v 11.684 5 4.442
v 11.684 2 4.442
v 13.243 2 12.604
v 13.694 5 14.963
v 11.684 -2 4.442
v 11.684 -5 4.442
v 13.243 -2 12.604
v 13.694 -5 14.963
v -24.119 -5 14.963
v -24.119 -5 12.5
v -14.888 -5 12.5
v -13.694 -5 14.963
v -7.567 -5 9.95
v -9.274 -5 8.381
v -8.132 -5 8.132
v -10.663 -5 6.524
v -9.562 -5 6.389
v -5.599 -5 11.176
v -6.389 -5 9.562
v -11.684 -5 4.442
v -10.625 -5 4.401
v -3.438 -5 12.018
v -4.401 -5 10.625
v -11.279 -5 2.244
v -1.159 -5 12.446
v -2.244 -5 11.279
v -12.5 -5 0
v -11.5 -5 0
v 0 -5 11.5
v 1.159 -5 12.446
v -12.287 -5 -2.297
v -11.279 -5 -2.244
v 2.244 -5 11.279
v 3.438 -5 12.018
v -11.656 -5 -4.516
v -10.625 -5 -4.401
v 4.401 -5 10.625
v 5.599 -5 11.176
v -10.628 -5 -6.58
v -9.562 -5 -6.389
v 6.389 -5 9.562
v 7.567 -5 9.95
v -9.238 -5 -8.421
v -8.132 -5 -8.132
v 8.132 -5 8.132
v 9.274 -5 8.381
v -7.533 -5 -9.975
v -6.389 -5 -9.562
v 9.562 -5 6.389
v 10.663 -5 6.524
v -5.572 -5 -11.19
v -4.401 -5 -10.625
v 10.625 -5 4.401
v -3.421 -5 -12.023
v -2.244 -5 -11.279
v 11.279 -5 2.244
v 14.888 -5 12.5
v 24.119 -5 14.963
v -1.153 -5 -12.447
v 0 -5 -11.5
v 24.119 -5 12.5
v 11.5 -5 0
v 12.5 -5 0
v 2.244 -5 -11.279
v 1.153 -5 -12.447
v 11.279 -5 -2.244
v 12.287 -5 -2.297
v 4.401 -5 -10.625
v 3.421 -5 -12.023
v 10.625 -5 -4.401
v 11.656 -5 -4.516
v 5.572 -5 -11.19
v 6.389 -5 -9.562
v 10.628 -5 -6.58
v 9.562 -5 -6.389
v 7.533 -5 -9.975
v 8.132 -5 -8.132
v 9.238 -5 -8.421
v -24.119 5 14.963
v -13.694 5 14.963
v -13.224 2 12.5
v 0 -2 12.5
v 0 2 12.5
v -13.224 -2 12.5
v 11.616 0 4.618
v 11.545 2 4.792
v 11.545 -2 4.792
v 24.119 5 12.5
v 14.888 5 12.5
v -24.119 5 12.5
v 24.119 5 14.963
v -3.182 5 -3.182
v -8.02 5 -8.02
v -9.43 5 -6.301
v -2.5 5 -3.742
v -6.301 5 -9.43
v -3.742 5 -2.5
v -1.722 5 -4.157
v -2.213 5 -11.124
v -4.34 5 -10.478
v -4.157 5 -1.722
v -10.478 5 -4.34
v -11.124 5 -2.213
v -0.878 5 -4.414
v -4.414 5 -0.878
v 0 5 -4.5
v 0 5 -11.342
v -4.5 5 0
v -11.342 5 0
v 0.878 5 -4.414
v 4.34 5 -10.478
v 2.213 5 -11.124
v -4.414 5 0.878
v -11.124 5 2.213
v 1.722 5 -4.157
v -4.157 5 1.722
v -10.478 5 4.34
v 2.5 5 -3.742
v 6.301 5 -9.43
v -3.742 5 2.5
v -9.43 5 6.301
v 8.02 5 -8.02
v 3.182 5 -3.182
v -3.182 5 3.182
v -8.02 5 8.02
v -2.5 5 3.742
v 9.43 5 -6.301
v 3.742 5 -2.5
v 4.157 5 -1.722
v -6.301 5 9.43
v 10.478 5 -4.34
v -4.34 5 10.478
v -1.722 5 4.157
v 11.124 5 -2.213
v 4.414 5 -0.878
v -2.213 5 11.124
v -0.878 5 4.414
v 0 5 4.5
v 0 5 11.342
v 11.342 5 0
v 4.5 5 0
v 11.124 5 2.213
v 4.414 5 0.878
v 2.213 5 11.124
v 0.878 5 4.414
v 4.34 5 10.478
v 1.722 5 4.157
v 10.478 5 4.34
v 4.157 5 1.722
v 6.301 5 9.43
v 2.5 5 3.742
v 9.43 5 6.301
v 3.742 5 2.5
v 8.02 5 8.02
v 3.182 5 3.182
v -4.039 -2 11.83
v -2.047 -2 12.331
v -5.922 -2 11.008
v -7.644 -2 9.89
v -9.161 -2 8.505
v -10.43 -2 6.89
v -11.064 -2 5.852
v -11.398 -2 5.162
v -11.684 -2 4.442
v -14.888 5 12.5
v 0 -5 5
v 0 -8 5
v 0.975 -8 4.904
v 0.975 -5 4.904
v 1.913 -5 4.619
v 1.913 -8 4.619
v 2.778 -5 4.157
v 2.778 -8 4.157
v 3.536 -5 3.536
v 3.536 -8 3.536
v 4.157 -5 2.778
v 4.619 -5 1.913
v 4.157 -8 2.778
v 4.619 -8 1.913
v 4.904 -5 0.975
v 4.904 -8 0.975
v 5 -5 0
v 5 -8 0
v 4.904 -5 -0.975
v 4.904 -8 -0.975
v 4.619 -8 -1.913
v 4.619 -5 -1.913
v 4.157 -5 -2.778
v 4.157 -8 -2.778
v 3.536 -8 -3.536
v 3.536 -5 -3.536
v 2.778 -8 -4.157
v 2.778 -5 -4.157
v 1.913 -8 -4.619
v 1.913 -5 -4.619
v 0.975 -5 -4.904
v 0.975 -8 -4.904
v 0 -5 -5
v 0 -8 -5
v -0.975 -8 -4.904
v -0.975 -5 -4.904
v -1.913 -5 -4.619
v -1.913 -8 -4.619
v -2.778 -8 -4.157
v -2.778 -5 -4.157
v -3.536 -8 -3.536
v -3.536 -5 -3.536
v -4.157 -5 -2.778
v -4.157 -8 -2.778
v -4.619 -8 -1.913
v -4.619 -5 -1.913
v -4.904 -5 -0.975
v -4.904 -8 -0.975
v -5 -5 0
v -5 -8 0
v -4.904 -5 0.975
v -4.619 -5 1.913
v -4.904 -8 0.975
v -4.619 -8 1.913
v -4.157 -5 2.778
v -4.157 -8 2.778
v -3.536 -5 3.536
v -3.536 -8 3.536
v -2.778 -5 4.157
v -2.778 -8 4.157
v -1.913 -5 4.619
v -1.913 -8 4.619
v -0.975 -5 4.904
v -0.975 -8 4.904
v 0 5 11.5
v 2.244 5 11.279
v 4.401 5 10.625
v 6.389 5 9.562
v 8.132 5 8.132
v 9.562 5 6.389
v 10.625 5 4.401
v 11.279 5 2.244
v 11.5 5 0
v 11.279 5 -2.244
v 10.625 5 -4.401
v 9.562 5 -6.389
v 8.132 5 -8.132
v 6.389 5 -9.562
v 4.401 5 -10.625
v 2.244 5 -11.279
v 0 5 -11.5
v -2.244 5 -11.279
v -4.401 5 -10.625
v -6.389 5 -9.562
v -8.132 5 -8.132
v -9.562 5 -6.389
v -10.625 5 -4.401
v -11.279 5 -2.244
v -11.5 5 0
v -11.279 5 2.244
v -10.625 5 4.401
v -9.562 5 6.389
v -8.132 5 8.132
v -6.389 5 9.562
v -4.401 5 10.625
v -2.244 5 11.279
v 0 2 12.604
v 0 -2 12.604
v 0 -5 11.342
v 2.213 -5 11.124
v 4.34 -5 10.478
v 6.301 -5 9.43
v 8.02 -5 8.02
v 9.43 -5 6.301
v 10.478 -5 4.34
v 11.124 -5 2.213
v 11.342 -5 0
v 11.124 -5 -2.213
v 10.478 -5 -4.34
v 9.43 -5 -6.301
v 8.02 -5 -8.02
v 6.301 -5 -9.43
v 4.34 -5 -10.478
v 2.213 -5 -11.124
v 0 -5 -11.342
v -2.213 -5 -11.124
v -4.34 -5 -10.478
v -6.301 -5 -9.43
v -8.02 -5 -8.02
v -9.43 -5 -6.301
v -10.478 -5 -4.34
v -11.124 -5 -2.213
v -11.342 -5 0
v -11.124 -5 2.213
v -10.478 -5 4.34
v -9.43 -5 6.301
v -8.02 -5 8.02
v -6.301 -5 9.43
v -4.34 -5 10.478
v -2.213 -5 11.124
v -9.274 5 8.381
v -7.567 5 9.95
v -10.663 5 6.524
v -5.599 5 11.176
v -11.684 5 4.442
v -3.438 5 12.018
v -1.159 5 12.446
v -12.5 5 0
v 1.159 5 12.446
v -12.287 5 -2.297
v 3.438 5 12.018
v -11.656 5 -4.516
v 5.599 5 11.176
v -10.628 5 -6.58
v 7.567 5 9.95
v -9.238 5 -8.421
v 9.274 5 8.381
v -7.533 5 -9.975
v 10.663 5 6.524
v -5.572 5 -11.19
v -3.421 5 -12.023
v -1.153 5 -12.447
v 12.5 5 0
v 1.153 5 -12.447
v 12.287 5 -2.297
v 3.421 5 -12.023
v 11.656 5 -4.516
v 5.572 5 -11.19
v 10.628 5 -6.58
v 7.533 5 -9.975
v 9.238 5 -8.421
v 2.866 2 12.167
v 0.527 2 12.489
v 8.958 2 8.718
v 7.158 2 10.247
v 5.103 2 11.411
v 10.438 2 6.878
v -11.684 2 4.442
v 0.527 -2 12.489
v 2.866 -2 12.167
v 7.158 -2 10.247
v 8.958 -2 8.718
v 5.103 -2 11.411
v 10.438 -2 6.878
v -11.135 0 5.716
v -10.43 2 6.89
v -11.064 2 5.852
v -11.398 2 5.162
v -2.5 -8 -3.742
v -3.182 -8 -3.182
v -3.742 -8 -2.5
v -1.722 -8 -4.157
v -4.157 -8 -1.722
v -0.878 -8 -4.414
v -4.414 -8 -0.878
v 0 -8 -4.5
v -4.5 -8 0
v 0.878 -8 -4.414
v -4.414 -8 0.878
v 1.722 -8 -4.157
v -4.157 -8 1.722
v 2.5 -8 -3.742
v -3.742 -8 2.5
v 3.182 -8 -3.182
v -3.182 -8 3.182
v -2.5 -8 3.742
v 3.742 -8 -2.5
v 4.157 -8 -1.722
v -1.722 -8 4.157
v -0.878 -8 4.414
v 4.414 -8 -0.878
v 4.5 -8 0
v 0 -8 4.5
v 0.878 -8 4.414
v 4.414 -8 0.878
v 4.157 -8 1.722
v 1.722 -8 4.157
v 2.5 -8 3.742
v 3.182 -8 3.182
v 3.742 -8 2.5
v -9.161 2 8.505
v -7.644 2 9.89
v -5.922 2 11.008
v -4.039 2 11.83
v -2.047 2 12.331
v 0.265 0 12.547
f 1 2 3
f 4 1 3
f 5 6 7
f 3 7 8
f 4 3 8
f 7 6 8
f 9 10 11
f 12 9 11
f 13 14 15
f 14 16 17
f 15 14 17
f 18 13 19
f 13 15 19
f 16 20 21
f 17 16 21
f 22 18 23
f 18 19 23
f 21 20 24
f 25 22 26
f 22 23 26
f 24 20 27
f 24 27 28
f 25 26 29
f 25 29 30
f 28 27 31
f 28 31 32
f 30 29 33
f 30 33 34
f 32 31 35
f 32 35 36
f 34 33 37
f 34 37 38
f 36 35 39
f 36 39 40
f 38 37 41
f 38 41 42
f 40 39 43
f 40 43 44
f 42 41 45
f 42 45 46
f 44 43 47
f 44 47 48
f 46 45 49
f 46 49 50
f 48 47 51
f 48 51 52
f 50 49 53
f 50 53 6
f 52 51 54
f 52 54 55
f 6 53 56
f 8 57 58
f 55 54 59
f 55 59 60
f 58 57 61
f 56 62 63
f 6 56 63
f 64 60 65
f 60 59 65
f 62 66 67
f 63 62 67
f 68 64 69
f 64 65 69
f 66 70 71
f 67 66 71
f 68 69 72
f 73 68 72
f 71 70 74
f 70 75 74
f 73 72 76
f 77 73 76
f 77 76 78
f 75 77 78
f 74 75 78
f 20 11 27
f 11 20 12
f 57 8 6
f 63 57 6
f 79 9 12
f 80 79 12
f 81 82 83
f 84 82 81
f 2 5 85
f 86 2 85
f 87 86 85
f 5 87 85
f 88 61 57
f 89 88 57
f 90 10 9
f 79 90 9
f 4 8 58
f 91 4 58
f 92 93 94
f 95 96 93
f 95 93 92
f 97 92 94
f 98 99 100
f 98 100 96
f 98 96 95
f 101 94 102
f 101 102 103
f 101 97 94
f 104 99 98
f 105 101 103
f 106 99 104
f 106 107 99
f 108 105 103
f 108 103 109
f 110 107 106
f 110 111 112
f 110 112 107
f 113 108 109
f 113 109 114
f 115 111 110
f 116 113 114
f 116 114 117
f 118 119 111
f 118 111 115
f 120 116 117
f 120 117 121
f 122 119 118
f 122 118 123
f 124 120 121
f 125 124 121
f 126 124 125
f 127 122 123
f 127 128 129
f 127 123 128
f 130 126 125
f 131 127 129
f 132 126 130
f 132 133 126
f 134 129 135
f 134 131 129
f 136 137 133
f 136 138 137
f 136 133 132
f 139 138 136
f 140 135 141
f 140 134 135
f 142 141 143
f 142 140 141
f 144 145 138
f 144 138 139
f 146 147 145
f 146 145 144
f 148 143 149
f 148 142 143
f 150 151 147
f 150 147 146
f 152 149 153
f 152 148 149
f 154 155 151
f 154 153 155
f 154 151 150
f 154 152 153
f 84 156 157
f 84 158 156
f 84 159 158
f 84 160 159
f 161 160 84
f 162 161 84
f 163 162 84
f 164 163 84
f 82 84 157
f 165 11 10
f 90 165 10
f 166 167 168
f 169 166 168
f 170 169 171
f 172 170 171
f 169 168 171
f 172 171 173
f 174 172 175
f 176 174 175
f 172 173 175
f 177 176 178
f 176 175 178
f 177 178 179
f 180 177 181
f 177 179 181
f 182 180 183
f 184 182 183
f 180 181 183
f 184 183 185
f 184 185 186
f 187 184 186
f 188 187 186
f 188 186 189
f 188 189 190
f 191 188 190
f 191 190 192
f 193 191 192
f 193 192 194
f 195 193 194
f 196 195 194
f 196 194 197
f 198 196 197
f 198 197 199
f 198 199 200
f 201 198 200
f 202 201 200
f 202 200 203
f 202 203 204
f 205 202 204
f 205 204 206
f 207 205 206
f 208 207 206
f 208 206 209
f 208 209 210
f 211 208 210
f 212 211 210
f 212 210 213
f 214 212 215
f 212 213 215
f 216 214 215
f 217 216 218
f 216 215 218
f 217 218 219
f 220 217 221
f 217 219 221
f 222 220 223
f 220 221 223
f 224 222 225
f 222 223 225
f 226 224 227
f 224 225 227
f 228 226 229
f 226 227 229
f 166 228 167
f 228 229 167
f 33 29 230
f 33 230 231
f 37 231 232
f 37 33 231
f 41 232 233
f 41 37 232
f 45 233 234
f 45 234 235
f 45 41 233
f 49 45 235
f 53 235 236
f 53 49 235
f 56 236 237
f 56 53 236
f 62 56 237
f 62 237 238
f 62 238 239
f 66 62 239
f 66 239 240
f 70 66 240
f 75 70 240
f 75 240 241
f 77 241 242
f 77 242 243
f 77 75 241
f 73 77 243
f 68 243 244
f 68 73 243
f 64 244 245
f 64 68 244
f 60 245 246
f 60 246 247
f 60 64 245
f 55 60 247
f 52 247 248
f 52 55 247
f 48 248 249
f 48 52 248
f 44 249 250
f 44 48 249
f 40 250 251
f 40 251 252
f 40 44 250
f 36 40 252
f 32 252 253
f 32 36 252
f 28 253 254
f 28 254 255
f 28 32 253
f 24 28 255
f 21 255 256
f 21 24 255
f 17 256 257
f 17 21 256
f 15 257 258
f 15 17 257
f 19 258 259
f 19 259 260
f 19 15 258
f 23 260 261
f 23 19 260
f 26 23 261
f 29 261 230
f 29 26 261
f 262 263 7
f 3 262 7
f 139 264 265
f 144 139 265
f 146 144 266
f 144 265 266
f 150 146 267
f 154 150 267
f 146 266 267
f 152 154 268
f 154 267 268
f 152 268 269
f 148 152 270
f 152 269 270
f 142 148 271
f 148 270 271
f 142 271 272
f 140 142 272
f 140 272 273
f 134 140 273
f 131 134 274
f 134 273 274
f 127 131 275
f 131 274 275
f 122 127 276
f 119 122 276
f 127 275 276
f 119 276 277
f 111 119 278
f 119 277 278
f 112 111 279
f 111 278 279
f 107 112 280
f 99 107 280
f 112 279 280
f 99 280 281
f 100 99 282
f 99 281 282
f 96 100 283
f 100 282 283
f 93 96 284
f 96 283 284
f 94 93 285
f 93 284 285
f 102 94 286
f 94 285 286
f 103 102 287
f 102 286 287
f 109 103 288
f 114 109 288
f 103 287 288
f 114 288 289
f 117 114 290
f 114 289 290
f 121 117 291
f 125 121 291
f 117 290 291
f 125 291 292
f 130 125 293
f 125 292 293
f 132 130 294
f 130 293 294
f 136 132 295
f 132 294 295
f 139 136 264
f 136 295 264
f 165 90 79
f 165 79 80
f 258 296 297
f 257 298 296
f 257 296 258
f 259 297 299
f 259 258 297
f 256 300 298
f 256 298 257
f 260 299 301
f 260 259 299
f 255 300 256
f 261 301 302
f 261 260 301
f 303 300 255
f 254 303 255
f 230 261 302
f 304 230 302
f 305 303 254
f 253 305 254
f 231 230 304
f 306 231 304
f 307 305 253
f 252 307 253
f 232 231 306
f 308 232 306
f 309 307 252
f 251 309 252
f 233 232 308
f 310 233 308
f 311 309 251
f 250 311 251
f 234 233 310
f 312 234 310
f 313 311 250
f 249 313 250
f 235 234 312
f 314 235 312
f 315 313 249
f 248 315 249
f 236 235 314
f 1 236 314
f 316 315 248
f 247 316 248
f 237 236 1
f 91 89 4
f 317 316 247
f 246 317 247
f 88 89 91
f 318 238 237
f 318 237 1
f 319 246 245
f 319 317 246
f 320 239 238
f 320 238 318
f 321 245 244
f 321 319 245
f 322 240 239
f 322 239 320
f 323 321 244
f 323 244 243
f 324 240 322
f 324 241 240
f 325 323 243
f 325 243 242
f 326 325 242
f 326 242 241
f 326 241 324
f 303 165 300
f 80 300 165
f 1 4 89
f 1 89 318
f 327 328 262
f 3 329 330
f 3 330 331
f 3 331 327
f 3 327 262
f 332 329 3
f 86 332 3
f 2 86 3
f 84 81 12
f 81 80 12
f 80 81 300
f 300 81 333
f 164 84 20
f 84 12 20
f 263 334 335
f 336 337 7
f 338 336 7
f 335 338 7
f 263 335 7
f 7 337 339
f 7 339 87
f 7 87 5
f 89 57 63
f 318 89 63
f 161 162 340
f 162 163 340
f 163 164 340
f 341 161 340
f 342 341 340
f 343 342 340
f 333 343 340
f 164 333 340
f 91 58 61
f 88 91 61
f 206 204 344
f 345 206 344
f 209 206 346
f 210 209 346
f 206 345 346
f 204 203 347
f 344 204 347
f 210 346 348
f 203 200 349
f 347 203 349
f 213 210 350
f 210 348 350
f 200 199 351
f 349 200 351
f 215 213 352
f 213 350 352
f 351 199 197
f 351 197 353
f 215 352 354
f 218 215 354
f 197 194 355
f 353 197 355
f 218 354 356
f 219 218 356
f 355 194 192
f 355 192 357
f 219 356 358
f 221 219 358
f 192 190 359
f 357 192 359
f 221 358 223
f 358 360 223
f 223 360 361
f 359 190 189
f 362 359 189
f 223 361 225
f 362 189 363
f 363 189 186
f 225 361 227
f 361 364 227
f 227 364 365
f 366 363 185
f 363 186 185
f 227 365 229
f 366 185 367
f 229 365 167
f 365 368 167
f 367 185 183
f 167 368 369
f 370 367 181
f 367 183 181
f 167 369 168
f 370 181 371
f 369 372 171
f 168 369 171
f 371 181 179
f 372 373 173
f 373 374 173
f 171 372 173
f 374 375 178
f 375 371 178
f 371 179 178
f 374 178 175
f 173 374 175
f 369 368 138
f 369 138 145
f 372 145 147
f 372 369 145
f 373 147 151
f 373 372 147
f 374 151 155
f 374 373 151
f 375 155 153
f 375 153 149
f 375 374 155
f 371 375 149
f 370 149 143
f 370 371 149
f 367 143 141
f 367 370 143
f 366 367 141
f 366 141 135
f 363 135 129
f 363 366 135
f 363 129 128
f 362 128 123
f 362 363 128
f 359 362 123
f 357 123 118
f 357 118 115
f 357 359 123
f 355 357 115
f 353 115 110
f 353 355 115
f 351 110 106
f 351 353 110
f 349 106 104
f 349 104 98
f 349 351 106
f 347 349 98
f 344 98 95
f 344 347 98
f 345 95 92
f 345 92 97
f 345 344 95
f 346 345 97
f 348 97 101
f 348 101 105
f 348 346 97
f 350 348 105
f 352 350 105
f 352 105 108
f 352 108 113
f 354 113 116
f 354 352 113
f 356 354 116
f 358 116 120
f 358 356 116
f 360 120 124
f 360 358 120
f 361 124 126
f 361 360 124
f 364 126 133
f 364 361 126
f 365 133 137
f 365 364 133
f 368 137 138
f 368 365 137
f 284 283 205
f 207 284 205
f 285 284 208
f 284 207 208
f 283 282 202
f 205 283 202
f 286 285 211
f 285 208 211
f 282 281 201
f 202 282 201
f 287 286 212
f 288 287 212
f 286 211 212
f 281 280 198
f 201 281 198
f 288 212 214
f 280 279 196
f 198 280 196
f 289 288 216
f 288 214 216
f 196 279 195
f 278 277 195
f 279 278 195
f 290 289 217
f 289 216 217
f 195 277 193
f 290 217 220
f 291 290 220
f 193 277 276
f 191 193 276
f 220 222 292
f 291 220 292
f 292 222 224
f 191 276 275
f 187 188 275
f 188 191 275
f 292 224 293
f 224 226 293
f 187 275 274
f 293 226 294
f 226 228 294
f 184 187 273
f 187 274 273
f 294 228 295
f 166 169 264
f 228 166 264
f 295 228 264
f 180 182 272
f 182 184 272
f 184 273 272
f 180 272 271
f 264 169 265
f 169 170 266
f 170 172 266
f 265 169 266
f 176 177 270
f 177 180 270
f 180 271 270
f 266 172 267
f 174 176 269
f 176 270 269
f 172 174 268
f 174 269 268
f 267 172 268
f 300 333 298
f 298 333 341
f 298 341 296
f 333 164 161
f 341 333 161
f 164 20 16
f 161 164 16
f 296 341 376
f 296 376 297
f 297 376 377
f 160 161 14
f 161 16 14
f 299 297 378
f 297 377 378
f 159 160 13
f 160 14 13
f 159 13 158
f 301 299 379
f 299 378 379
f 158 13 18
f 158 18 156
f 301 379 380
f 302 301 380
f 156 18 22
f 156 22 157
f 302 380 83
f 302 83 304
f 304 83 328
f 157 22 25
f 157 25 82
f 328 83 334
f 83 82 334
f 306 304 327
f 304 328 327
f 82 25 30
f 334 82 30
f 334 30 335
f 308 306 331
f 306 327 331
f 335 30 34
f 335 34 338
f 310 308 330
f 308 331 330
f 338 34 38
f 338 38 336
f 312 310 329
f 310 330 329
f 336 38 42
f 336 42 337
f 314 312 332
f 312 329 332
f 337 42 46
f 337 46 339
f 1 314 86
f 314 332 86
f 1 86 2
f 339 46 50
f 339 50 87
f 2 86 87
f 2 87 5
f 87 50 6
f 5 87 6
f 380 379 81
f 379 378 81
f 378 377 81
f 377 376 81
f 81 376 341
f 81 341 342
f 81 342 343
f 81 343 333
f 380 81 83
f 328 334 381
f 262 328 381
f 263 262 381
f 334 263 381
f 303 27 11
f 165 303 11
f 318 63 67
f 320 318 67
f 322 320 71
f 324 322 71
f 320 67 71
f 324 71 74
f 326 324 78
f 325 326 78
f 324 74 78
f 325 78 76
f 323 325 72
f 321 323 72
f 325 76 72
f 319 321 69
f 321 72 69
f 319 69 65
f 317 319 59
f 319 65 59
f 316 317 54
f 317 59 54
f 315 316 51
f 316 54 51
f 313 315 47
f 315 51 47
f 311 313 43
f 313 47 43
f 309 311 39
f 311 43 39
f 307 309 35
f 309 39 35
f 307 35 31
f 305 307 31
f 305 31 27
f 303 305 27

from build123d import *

# Parameters (mm, degrees)
BOSS_EXTRUDE1_DEPTH      = 5
BOSS_EXTRUDE1_DEPTH_BACK = 5
SKETCH1_R                = 11.5
BOSS_EXTRUDE2_START      = -2
BOSS_EXTRUDE2_DEPTH      = 4
BOSS_EXTRUDE3_DEPTH      = 2
BOSS_EXTRUDE3_DEPTH_BACK = 2
BOSS_EXTRUDE4_DEPTH      = 5
BOSS_EXTRUDE4_DEPTH_BACK = 5
SKETCH5_R                = 11.341581645
SKETCH5_R_2              = 10.881998828
BOSS_EXTRUDE5_DEPTH      = 5
BOSS_EXTRUDE5_DEPTH_BACK = 5
SKETCH6_R                = 10.881998828
SKETCH6_R_2              = 5
BOSS_EXTRUDE6_DEPTH      = 5
BOSS_EXTRUDE6_DEPTH_BACK = 8
SKETCH7_R                = 5
SKETCH7_R_2              = 4.5


# Read off the part's stored shape, not the designer's step: Boss-Extrude2
with BuildPart() as part:
    # Sketch1 → Boss-Extrude1 (new, two sides: drawn at the far end of the back side and taken through both)
    with BuildSketch(Plane(origin=(0, 0, 0), x_dir=(1, 0, 0), z_dir=(0, 1, 0)).offset(-BOSS_EXTRUDE1_DEPTH_BACK)):
        with BuildLine():
            Line((-12.5, 0), (-14.888075294, -12.5))
            Line((-14.888075294, -12.5), (-24.118681977, -12.5))
            Line((-24.118681977, -12.5), (-24.118681977, -14.962515671))
            Line((-24.118681977, -14.962515671), (-14.888075294, -14.962515671))
            Line((-14.888075294, -14.962515671), (-13.694037647, -14.962515671))
            Line((-13.694037647, -14.962515671), (-11.684129612, -4.441971995))
            ThreePointArc((-11.684129612, -4.441971995), (0, -12.5), (11.684129612, -4.441971995))
            Line((11.684129612, -4.441971995), (13.694037647, -14.962515671))
            Line((13.694037647, -14.962515671), (14.888075294, -14.962515671))
            Line((14.888075294, -14.962515671), (24.118681977, -14.962515671))
            Line((24.118681977, -14.962515671), (24.118681977, -12.5))
            Line((24.118681977, -12.5), (14.888075294, -12.5))
            Line((14.888075294, -12.5), (12.5, 0))
            ThreePointArc((12.5, 0), (0, 12.5), (-12.5, 0))
        make_face()
        with Locations(Location((0, 0, 0), (0, 0, 270))):
            Circle(SKETCH1_R, mode=Mode.SUBTRACT)
    extrude(amount=BOSS_EXTRUDE1_DEPTH + BOSS_EXTRUDE1_DEPTH_BACK)

    # Boss-Extrude2 outline → Boss-Extrude2 (add)
    with BuildSketch(Plane(origin=(0, 0, 0), x_dir=(1, 0, 0), z_dir=(0, 1, 0)).offset(BOSS_EXTRUDE2_START)):
        with BuildLine():
            ThreePointArc((11.545060202, -4.7918248), (7.158411272, -10.247299549), (0.526660373, -12.488900226))
            add(Edge.make_bspline(
                [(0.526660373, -12.488900226), (0.266171619, -12.548222015), (0, -12.604103366)],
                knots=[0.689319893, 0.689319893, 0.689319893, 0.709533534, 0.709533534, 0.709533534], degree=2))
            Line((0, -12.604103366), (13.243472354, -12.604103366))
            Line((13.243472354, -12.604103366), (11.684129612, -4.441971995))
            add(Edge.make_bspline(
                [(11.684129612, -4.441971995), (11.61743634, -4.618618616), (11.545060202, -4.7918248)],
                knots=[0, 0, 0, 0.020213641, 0.020213641, 0.020213641], degree=2))
        make_face()
    extrude(amount=BOSS_EXTRUDE2_DEPTH)

    # Sketch4 → Boss-Extrude3 (add, two sides: drawn at the far end of the back side and taken through both)
    with BuildSketch(Plane(origin=(0, 0, 0), x_dir=(1, 0, 0), z_dir=(0, 1, 0)).offset(-BOSS_EXTRUDE3_DEPTH_BACK)):
        with BuildLine():
            Line((0, -12.5), (-13.22358382, -12.5))
            Line((-13.22358382, -12.5), (-11.684129612, -4.441971995))
            add(Edge.make_bspline(
                [(0, -12.5), (-9.420476938, -10.800220507), (-11.684129612, -4.441971995)],
                knots=[0, 0, 0, 0.791193812, 0.791193812, 0.791193812], degree=2))
        make_face()
    extrude(amount=BOSS_EXTRUDE3_DEPTH + BOSS_EXTRUDE3_DEPTH_BACK)


with BuildPart() as body_2:
    # Sketch5 → Boss-Extrude4 (new, two sides: drawn at the far end of the back side and taken through both)
    with BuildSketch(Plane(origin=(0, 0, 0), x_dir=(1, 0, 0), z_dir=(0, 1, 0)).offset(-BOSS_EXTRUDE4_DEPTH_BACK)):
        with Locations(Location((0, 0, 0), (0, 0, 270))):
            Circle(SKETCH5_R)
        with Locations(Location((0, 0, 0), (0, 0, 270))):
            Circle(SKETCH5_R_2, mode=Mode.SUBTRACT)
    extrude(amount=BOSS_EXTRUDE4_DEPTH + BOSS_EXTRUDE4_DEPTH_BACK)



with BuildPart() as body_3:
    # Sketch6 → Boss-Extrude5 (new, two sides: drawn at the far end of the back side and taken through both)
    with BuildSketch(Plane(origin=(0, 0, 0), x_dir=(1, 0, 0), z_dir=(0, 1, 0)).offset(-BOSS_EXTRUDE5_DEPTH_BACK)):
        with Locations(Location((0, 0, 0), (0, 0, 270))):
            Circle(SKETCH6_R)
        with Locations(Location((0, 0, 0), (0, 0, 270))):
            Circle(SKETCH6_R_2, mode=Mode.SUBTRACT)
    extrude(amount=BOSS_EXTRUDE5_DEPTH + BOSS_EXTRUDE5_DEPTH_BACK)


with BuildPart() as body_2_1:
    add(body_2.part)

    add(body_3.part)  # Boss-Extrude6 merges body 3
    # Sketch7 → Boss-Extrude6 (add, two sides: drawn at the far end of the back side and taken through both)
    with BuildSketch(Plane(origin=(0, 0, 0), x_dir=(1, 0, 0), z_dir=(0, 1, 0)).offset(-BOSS_EXTRUDE6_DEPTH_BACK)):
        with Locations(Location((0, 0, 0), (0, 0, 270))):
            Circle(SKETCH7_R)
        with Locations(Location((0, 0, 0), (0, 0, 270))):
            Circle(SKETCH7_R_2, mode=Mode.SUBTRACT)
    extrude(amount=BOSS_EXTRUDE6_DEPTH + BOSS_EXTRUDE6_DEPTH_BACK)


solid = Compound([part.part, body_2_1.part])
